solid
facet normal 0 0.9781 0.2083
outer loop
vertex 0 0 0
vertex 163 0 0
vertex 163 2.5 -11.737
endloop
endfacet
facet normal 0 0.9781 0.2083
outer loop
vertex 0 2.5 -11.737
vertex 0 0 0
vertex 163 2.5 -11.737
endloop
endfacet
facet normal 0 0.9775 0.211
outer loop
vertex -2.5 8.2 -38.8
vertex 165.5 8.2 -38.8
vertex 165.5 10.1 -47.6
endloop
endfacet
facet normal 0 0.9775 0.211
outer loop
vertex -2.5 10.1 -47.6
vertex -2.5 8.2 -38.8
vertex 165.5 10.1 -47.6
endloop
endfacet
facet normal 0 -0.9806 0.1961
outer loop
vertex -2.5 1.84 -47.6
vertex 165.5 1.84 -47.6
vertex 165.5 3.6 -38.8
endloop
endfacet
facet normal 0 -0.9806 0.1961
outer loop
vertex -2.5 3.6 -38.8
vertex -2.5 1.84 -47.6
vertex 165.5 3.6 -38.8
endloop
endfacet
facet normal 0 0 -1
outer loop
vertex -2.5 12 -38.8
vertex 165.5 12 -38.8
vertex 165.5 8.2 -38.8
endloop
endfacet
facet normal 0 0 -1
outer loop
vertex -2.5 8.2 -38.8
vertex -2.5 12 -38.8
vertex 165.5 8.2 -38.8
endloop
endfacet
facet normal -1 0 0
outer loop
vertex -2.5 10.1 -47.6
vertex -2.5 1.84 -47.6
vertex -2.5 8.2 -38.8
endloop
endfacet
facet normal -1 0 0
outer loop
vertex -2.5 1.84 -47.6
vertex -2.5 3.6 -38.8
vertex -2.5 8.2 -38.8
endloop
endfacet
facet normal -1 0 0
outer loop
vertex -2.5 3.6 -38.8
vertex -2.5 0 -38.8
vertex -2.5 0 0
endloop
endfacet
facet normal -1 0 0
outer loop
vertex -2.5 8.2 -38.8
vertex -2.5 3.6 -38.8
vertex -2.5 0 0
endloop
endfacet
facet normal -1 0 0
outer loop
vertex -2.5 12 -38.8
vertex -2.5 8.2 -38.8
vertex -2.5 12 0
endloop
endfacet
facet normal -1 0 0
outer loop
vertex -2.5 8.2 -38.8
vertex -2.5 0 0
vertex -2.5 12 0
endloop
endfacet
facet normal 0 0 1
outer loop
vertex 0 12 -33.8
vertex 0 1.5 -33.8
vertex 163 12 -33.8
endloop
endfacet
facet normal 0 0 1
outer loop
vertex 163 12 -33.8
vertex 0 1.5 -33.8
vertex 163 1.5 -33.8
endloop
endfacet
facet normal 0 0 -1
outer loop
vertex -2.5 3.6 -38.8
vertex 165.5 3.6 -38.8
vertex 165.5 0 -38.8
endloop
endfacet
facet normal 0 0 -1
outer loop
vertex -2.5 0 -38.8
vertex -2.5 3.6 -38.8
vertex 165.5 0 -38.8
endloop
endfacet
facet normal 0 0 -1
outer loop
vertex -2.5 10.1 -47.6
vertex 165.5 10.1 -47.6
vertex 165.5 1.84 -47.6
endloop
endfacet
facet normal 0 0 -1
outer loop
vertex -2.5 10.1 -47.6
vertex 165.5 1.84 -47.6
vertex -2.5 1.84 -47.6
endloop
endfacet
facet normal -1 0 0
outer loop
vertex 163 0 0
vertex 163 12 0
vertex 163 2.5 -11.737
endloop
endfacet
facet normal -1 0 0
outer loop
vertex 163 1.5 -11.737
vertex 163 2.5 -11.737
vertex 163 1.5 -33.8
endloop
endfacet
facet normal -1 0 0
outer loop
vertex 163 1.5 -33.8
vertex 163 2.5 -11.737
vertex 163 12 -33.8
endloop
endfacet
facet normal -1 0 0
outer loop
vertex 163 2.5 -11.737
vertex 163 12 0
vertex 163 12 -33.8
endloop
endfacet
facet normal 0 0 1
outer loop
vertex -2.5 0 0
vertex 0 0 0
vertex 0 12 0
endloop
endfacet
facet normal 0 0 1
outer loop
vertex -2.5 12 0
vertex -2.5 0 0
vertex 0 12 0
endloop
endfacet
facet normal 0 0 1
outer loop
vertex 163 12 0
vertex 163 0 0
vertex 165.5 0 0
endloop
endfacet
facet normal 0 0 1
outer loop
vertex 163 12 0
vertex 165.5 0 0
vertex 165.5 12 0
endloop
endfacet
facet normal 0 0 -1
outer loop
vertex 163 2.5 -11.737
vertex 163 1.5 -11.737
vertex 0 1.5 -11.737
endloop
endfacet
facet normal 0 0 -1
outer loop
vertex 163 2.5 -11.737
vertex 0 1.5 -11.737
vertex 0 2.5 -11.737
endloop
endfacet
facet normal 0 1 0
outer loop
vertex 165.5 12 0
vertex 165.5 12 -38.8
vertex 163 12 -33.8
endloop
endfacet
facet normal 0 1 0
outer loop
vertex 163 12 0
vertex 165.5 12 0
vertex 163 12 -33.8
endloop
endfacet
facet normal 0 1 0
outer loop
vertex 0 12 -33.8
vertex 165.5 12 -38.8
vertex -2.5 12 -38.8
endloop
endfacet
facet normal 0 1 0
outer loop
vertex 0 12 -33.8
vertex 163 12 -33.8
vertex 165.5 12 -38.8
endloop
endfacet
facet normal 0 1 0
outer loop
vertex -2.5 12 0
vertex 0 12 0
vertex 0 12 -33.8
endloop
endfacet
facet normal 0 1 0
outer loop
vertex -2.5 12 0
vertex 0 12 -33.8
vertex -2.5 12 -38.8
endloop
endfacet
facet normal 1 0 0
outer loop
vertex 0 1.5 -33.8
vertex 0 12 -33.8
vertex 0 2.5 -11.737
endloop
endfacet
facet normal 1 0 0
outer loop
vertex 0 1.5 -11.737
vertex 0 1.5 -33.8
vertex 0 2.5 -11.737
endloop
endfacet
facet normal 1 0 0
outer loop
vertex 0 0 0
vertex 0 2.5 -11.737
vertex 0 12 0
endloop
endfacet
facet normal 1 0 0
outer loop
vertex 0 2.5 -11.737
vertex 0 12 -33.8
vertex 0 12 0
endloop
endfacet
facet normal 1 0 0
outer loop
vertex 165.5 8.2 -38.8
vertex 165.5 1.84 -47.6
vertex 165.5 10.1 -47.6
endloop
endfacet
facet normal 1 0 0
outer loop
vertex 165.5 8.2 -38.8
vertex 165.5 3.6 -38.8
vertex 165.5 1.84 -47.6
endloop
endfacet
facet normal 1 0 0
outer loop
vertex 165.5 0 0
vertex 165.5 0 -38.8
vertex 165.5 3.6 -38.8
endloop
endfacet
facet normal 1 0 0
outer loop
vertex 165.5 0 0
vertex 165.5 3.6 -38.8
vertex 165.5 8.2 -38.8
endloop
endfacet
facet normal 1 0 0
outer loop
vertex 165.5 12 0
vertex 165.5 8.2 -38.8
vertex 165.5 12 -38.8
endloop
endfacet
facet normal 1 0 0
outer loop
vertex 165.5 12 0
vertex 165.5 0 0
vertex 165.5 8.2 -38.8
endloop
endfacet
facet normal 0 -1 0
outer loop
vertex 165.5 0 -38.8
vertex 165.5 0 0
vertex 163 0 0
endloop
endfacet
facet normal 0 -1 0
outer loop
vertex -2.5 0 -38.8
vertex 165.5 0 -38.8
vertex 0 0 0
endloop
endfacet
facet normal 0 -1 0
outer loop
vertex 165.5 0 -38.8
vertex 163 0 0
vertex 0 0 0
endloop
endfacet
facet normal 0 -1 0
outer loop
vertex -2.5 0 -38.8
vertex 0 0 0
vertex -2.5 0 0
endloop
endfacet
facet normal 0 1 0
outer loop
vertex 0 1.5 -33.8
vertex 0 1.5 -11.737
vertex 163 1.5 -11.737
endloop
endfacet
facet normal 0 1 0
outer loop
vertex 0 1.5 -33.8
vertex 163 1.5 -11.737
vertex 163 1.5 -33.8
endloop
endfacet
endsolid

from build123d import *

# Parameters (mm, degrees)
SKETCH1_W           = 163
SKETCH1_H           = 38.8
BOSS_EXTRUDE1_DEPTH = 2.5
CUT_EXTRUDE1_DEPTH  = 168
SKETCH4_W           = 27.063305406
SKETCH4_H           = 1
CUT_EXTRUDE2_DEPTH  = 168
SKETCH5_W           = 163
SKETCH5_H           = 5
BOSS_EXTRUDE2_DEPTH = 10.5
SKETCH6_W           = 38.8
SKETCH6_H           = 12
BOSS_EXTRUDE3_DEPTH = 2.5
SKETCH7_W           = 38.8
SKETCH7_H           = 12
BOSS_EXTRUDE4_DEPTH = 2.5
SKETCH8_W           = 168
SKETCH8_H           = 12
BOSS_EXTRUDE5_DEPTH = 8.8
SKETCH9_W           = 8.8
SKETCH9_H           = 1.9
SKETCH9_W_2         = 9
SKETCH9_H_2         = 1.8
CUT_EXTRUDE3_DEPTH  = 176.025026782


with BuildPart() as part:
    # Sketch1 → Boss-Extrude1 (new body)
    with BuildSketch(Plane(origin=(0, 0, 0), x_dir=(1, 0, 0), z_dir=(0, 1, 0))):
        with Locations((81.5, 19.4)):
            Rectangle(SKETCH1_W, SKETCH1_H)
    extrude(amount=BOSS_EXTRUDE1_DEPTH)

    # Sketch3 → Cut-Extrude1 (cut)
    with BuildSketch(Plane(origin=(163, 0, 0), x_dir=(0, 0, -1), z_dir=(1, 0, 0))):
        Polygon((0, 0), (11.736694594, 2.5), (0, 2.5), align=None)
    extrude(amount=-CUT_EXTRUDE1_DEPTH, mode=Mode.SUBTRACT)

    # Sketch4 → Cut-Extrude2 (cut)
    with BuildSketch(Plane(origin=(163, 0, 0), x_dir=(0, 0, -1), z_dir=(1, 0, 0))):
        with Locations((25.268347297, 2)):
            Rectangle(SKETCH4_W, SKETCH4_H)
    extrude(amount=-CUT_EXTRUDE2_DEPTH, mode=Mode.SUBTRACT)

    # Sketch5 → Boss-Extrude2 (add)
    with BuildSketch(Plane(origin=(0, 1.5, 0), x_dir=(1, 0, 0), z_dir=(0, 1, 0))):
        with Locations((81.5, 36.3)):
            Rectangle(SKETCH5_W, SKETCH5_H)
    extrude(amount=BOSS_EXTRUDE2_DEPTH)

    # Sketch6 → Boss-Extrude3 (add)
    with BuildSketch(Plane.ZY):
        with Locations((-19.4, 6)):
            Rectangle(SKETCH6_W, SKETCH6_H)
    extrude(amount=BOSS_EXTRUDE3_DEPTH)

    # Sketch7 → Boss-Extrude4 (add)
    with BuildSketch(Plane(origin=(163, 0, 0), x_dir=(0, 0, -1), z_dir=(1, 0, 0))):
        with Locations((19.4, 6)):
            Rectangle(SKETCH7_W, SKETCH7_H)
    extrude(amount=BOSS_EXTRUDE4_DEPTH)

    # Sketch8 → Boss-Extrude5 (add)
    with BuildSketch(Plane(origin=(0, 0, -38.8), x_dir=(-1, 0, 0), z_dir=(0, 0, -1))):
        with Locations((-81.5, 6)):
            Rectangle(SKETCH8_W, SKETCH8_H)
    extrude(amount=BOSS_EXTRUDE5_DEPTH)

    # Sketch9 → Cut-Extrude3 (cut, through all)
    with BuildSketch(Plane(origin=(165.5, 0, 0), x_dir=(0, 0, -1), z_dir=(1, 0, 0))):
        with Locations((43.2, 11.05)):
            Rectangle(SKETCH9_W, SKETCH9_H)
        Polygon((47.8, 1.8), (38.8, 3.6), (38.8, 1.8), align=None)
        Polygon((47.6, 10.1), (38.8, 10.1), (38.8, 8.2), align=None)
        with Locations((43.3, 0.9)):
            Rectangle(SKETCH9_W_2, SKETCH9_H_2)
    extrude(amount=-CUT_EXTRUDE3_DEPTH, mode=Mode.SUBTRACT)


solid = part.part
